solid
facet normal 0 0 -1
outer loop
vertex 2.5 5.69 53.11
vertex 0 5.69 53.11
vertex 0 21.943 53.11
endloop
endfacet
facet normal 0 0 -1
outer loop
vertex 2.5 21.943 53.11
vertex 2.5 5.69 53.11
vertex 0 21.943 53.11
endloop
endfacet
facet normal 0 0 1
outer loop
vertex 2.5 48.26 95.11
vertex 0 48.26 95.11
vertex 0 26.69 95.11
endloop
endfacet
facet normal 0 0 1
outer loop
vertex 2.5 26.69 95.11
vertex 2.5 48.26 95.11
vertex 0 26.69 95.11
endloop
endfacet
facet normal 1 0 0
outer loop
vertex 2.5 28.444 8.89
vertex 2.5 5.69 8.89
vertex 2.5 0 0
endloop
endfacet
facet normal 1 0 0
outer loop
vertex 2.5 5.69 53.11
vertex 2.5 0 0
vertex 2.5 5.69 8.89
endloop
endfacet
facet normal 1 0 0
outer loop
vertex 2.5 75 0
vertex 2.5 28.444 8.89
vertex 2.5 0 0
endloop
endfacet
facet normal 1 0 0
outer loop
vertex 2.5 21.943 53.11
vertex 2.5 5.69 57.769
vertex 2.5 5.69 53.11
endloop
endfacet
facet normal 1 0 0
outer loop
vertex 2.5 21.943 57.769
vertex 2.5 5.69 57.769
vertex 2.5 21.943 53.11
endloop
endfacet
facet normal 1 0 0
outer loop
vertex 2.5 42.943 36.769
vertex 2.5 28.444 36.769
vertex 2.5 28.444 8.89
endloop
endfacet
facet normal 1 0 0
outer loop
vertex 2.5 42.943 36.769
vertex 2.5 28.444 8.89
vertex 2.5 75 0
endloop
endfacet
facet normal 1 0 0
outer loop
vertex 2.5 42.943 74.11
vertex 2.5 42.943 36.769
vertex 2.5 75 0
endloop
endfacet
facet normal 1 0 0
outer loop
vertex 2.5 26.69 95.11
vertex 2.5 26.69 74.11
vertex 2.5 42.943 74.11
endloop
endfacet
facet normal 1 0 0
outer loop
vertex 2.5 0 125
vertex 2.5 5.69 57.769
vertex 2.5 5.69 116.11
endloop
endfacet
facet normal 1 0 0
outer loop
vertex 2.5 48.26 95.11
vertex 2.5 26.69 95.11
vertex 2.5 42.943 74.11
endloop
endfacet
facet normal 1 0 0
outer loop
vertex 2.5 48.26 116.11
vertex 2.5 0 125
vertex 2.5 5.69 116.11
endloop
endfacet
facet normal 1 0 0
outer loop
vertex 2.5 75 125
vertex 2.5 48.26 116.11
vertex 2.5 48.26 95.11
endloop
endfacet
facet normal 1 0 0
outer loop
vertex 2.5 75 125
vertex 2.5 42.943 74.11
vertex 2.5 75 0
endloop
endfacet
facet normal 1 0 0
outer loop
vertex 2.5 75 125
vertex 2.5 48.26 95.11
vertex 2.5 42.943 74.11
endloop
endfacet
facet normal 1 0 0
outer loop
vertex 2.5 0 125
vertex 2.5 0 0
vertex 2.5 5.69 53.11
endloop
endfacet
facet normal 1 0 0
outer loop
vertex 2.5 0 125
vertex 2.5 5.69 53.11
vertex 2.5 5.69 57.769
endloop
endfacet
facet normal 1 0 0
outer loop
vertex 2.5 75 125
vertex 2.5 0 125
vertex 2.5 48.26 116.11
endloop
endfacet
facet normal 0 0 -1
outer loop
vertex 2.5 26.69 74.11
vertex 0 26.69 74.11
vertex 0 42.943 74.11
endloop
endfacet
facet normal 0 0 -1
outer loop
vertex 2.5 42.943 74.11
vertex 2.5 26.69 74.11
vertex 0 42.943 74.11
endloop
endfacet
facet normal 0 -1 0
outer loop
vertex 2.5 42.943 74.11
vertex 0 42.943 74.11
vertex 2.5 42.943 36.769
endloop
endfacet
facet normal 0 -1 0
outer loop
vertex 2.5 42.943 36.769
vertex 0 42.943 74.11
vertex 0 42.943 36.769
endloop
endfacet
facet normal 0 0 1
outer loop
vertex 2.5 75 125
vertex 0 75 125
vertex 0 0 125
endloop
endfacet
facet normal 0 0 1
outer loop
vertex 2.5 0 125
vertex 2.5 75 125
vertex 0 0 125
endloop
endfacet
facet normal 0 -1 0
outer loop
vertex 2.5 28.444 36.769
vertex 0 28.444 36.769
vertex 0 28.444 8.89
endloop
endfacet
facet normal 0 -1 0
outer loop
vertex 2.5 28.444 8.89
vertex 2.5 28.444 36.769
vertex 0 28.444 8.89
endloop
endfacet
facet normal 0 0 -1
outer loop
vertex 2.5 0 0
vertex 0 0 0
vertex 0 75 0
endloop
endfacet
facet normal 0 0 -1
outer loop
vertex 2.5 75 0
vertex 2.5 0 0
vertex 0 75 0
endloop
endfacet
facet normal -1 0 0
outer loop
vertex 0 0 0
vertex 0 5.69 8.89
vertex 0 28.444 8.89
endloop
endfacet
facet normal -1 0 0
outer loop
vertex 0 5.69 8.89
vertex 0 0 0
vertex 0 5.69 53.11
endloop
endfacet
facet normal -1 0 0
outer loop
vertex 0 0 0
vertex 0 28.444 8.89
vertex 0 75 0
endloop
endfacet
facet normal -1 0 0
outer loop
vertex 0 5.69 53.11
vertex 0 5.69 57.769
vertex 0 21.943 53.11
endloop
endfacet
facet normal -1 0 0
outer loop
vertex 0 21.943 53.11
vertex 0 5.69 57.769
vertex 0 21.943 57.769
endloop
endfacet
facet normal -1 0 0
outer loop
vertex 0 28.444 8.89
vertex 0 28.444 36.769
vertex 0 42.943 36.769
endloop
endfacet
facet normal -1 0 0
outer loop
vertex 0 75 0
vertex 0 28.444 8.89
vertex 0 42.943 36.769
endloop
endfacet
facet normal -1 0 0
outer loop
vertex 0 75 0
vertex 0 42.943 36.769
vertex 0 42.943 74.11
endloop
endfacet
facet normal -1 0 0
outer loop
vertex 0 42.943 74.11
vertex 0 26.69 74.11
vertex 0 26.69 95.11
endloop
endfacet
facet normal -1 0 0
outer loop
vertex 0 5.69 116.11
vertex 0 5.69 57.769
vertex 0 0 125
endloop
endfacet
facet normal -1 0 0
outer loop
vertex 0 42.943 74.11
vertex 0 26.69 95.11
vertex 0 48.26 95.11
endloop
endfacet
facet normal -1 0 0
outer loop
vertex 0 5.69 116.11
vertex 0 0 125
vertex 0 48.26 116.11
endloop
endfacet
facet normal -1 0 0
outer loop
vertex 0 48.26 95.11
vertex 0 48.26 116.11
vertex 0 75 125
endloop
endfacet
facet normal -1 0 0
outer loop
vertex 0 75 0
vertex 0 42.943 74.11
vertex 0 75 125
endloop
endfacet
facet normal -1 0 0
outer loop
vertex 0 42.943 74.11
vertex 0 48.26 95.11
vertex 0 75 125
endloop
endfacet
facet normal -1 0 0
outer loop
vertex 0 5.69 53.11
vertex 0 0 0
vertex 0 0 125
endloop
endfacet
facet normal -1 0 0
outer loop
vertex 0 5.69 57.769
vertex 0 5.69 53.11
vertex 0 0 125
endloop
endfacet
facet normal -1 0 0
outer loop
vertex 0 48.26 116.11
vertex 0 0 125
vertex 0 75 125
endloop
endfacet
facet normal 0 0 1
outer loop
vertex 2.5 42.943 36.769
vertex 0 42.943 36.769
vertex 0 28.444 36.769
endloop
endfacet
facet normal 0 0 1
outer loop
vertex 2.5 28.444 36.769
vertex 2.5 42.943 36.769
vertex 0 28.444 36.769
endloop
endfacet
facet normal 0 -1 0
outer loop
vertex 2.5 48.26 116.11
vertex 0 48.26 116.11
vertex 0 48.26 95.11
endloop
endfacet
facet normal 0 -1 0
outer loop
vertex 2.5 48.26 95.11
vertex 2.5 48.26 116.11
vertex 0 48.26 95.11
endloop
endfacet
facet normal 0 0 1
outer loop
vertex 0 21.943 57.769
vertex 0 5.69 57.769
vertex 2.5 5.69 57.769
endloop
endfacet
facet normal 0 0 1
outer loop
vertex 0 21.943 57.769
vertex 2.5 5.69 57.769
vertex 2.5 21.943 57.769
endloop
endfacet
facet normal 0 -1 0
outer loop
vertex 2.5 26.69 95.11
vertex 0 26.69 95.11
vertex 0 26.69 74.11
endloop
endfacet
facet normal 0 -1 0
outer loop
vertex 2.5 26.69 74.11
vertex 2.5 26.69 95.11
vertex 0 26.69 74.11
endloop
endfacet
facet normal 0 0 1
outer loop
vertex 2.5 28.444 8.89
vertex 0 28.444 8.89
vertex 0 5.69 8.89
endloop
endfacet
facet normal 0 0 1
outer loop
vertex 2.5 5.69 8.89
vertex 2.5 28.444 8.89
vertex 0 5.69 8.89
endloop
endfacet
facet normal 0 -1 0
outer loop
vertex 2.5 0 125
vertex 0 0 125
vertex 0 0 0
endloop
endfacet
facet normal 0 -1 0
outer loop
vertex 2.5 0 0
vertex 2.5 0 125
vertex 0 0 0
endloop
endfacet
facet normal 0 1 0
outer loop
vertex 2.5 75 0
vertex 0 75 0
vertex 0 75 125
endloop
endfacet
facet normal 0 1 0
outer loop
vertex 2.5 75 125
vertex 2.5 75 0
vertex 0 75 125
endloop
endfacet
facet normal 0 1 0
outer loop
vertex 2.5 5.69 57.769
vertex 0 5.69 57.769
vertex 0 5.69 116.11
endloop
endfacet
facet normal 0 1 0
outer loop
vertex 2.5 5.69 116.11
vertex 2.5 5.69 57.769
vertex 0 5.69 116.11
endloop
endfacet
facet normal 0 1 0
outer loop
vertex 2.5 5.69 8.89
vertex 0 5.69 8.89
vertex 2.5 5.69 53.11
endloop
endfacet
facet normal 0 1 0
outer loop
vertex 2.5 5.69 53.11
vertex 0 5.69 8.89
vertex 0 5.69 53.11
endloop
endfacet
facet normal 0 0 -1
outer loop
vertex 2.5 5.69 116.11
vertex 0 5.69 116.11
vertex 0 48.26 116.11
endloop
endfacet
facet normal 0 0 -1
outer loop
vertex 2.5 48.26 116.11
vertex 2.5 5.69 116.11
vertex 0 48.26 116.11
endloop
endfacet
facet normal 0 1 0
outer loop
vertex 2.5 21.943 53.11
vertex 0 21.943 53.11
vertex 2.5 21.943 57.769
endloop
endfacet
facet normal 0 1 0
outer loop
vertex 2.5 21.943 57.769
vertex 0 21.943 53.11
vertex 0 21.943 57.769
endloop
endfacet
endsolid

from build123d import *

# Parameters (mm, degrees)
F0_W     = 16.253128
F0_H     = 4.658509
F1_DEPTH = 2.5


with BuildPart() as f1:
    # F0 (on Right) → F1 (new body)
    with BuildSketch(Plane.YZ):
        Polygon((0, 125), (0, 0), (75, 0), (75, 125), (71.19, 125), (50.19, 125), (49.408, 125), (44.505585, 125), align=None)
        Polygon((50.19, 121.19), (71.19, 121.19), (71.19, 3.81), (3.81, 3.81), (3.81, 121.19), (44.505585, 121.19), (49.408, 121.19), align=None, mode=Mode.SUBTRACT)
        Polygon((71.19, 3.81), (71.19, 121.19), (50.19, 121.19), (49.408, 121.19), (44.505585, 121.19), (3.81, 121.19), (3.81, 3.81), align=None)
        Polygon((5.690006, 116.11), (48.26, 116.11), (48.26, 95.11), (26.690006, 95.11), (26.690006, 74.11), (42.943134, 74.11), (42.943134, 36.768509), (28.444385, 36.768509), (28.444385, 8.89), (5.690006, 8.89), (5.690006, 53.11), (5.690006, 57.768509), align=None, mode=Mode.SUBTRACT)
        with Locations((13.81657, 55.439254)):
            Rectangle(F0_W, F0_H)
    extrude(amount=F1_DEPTH)


solid = f1.part
